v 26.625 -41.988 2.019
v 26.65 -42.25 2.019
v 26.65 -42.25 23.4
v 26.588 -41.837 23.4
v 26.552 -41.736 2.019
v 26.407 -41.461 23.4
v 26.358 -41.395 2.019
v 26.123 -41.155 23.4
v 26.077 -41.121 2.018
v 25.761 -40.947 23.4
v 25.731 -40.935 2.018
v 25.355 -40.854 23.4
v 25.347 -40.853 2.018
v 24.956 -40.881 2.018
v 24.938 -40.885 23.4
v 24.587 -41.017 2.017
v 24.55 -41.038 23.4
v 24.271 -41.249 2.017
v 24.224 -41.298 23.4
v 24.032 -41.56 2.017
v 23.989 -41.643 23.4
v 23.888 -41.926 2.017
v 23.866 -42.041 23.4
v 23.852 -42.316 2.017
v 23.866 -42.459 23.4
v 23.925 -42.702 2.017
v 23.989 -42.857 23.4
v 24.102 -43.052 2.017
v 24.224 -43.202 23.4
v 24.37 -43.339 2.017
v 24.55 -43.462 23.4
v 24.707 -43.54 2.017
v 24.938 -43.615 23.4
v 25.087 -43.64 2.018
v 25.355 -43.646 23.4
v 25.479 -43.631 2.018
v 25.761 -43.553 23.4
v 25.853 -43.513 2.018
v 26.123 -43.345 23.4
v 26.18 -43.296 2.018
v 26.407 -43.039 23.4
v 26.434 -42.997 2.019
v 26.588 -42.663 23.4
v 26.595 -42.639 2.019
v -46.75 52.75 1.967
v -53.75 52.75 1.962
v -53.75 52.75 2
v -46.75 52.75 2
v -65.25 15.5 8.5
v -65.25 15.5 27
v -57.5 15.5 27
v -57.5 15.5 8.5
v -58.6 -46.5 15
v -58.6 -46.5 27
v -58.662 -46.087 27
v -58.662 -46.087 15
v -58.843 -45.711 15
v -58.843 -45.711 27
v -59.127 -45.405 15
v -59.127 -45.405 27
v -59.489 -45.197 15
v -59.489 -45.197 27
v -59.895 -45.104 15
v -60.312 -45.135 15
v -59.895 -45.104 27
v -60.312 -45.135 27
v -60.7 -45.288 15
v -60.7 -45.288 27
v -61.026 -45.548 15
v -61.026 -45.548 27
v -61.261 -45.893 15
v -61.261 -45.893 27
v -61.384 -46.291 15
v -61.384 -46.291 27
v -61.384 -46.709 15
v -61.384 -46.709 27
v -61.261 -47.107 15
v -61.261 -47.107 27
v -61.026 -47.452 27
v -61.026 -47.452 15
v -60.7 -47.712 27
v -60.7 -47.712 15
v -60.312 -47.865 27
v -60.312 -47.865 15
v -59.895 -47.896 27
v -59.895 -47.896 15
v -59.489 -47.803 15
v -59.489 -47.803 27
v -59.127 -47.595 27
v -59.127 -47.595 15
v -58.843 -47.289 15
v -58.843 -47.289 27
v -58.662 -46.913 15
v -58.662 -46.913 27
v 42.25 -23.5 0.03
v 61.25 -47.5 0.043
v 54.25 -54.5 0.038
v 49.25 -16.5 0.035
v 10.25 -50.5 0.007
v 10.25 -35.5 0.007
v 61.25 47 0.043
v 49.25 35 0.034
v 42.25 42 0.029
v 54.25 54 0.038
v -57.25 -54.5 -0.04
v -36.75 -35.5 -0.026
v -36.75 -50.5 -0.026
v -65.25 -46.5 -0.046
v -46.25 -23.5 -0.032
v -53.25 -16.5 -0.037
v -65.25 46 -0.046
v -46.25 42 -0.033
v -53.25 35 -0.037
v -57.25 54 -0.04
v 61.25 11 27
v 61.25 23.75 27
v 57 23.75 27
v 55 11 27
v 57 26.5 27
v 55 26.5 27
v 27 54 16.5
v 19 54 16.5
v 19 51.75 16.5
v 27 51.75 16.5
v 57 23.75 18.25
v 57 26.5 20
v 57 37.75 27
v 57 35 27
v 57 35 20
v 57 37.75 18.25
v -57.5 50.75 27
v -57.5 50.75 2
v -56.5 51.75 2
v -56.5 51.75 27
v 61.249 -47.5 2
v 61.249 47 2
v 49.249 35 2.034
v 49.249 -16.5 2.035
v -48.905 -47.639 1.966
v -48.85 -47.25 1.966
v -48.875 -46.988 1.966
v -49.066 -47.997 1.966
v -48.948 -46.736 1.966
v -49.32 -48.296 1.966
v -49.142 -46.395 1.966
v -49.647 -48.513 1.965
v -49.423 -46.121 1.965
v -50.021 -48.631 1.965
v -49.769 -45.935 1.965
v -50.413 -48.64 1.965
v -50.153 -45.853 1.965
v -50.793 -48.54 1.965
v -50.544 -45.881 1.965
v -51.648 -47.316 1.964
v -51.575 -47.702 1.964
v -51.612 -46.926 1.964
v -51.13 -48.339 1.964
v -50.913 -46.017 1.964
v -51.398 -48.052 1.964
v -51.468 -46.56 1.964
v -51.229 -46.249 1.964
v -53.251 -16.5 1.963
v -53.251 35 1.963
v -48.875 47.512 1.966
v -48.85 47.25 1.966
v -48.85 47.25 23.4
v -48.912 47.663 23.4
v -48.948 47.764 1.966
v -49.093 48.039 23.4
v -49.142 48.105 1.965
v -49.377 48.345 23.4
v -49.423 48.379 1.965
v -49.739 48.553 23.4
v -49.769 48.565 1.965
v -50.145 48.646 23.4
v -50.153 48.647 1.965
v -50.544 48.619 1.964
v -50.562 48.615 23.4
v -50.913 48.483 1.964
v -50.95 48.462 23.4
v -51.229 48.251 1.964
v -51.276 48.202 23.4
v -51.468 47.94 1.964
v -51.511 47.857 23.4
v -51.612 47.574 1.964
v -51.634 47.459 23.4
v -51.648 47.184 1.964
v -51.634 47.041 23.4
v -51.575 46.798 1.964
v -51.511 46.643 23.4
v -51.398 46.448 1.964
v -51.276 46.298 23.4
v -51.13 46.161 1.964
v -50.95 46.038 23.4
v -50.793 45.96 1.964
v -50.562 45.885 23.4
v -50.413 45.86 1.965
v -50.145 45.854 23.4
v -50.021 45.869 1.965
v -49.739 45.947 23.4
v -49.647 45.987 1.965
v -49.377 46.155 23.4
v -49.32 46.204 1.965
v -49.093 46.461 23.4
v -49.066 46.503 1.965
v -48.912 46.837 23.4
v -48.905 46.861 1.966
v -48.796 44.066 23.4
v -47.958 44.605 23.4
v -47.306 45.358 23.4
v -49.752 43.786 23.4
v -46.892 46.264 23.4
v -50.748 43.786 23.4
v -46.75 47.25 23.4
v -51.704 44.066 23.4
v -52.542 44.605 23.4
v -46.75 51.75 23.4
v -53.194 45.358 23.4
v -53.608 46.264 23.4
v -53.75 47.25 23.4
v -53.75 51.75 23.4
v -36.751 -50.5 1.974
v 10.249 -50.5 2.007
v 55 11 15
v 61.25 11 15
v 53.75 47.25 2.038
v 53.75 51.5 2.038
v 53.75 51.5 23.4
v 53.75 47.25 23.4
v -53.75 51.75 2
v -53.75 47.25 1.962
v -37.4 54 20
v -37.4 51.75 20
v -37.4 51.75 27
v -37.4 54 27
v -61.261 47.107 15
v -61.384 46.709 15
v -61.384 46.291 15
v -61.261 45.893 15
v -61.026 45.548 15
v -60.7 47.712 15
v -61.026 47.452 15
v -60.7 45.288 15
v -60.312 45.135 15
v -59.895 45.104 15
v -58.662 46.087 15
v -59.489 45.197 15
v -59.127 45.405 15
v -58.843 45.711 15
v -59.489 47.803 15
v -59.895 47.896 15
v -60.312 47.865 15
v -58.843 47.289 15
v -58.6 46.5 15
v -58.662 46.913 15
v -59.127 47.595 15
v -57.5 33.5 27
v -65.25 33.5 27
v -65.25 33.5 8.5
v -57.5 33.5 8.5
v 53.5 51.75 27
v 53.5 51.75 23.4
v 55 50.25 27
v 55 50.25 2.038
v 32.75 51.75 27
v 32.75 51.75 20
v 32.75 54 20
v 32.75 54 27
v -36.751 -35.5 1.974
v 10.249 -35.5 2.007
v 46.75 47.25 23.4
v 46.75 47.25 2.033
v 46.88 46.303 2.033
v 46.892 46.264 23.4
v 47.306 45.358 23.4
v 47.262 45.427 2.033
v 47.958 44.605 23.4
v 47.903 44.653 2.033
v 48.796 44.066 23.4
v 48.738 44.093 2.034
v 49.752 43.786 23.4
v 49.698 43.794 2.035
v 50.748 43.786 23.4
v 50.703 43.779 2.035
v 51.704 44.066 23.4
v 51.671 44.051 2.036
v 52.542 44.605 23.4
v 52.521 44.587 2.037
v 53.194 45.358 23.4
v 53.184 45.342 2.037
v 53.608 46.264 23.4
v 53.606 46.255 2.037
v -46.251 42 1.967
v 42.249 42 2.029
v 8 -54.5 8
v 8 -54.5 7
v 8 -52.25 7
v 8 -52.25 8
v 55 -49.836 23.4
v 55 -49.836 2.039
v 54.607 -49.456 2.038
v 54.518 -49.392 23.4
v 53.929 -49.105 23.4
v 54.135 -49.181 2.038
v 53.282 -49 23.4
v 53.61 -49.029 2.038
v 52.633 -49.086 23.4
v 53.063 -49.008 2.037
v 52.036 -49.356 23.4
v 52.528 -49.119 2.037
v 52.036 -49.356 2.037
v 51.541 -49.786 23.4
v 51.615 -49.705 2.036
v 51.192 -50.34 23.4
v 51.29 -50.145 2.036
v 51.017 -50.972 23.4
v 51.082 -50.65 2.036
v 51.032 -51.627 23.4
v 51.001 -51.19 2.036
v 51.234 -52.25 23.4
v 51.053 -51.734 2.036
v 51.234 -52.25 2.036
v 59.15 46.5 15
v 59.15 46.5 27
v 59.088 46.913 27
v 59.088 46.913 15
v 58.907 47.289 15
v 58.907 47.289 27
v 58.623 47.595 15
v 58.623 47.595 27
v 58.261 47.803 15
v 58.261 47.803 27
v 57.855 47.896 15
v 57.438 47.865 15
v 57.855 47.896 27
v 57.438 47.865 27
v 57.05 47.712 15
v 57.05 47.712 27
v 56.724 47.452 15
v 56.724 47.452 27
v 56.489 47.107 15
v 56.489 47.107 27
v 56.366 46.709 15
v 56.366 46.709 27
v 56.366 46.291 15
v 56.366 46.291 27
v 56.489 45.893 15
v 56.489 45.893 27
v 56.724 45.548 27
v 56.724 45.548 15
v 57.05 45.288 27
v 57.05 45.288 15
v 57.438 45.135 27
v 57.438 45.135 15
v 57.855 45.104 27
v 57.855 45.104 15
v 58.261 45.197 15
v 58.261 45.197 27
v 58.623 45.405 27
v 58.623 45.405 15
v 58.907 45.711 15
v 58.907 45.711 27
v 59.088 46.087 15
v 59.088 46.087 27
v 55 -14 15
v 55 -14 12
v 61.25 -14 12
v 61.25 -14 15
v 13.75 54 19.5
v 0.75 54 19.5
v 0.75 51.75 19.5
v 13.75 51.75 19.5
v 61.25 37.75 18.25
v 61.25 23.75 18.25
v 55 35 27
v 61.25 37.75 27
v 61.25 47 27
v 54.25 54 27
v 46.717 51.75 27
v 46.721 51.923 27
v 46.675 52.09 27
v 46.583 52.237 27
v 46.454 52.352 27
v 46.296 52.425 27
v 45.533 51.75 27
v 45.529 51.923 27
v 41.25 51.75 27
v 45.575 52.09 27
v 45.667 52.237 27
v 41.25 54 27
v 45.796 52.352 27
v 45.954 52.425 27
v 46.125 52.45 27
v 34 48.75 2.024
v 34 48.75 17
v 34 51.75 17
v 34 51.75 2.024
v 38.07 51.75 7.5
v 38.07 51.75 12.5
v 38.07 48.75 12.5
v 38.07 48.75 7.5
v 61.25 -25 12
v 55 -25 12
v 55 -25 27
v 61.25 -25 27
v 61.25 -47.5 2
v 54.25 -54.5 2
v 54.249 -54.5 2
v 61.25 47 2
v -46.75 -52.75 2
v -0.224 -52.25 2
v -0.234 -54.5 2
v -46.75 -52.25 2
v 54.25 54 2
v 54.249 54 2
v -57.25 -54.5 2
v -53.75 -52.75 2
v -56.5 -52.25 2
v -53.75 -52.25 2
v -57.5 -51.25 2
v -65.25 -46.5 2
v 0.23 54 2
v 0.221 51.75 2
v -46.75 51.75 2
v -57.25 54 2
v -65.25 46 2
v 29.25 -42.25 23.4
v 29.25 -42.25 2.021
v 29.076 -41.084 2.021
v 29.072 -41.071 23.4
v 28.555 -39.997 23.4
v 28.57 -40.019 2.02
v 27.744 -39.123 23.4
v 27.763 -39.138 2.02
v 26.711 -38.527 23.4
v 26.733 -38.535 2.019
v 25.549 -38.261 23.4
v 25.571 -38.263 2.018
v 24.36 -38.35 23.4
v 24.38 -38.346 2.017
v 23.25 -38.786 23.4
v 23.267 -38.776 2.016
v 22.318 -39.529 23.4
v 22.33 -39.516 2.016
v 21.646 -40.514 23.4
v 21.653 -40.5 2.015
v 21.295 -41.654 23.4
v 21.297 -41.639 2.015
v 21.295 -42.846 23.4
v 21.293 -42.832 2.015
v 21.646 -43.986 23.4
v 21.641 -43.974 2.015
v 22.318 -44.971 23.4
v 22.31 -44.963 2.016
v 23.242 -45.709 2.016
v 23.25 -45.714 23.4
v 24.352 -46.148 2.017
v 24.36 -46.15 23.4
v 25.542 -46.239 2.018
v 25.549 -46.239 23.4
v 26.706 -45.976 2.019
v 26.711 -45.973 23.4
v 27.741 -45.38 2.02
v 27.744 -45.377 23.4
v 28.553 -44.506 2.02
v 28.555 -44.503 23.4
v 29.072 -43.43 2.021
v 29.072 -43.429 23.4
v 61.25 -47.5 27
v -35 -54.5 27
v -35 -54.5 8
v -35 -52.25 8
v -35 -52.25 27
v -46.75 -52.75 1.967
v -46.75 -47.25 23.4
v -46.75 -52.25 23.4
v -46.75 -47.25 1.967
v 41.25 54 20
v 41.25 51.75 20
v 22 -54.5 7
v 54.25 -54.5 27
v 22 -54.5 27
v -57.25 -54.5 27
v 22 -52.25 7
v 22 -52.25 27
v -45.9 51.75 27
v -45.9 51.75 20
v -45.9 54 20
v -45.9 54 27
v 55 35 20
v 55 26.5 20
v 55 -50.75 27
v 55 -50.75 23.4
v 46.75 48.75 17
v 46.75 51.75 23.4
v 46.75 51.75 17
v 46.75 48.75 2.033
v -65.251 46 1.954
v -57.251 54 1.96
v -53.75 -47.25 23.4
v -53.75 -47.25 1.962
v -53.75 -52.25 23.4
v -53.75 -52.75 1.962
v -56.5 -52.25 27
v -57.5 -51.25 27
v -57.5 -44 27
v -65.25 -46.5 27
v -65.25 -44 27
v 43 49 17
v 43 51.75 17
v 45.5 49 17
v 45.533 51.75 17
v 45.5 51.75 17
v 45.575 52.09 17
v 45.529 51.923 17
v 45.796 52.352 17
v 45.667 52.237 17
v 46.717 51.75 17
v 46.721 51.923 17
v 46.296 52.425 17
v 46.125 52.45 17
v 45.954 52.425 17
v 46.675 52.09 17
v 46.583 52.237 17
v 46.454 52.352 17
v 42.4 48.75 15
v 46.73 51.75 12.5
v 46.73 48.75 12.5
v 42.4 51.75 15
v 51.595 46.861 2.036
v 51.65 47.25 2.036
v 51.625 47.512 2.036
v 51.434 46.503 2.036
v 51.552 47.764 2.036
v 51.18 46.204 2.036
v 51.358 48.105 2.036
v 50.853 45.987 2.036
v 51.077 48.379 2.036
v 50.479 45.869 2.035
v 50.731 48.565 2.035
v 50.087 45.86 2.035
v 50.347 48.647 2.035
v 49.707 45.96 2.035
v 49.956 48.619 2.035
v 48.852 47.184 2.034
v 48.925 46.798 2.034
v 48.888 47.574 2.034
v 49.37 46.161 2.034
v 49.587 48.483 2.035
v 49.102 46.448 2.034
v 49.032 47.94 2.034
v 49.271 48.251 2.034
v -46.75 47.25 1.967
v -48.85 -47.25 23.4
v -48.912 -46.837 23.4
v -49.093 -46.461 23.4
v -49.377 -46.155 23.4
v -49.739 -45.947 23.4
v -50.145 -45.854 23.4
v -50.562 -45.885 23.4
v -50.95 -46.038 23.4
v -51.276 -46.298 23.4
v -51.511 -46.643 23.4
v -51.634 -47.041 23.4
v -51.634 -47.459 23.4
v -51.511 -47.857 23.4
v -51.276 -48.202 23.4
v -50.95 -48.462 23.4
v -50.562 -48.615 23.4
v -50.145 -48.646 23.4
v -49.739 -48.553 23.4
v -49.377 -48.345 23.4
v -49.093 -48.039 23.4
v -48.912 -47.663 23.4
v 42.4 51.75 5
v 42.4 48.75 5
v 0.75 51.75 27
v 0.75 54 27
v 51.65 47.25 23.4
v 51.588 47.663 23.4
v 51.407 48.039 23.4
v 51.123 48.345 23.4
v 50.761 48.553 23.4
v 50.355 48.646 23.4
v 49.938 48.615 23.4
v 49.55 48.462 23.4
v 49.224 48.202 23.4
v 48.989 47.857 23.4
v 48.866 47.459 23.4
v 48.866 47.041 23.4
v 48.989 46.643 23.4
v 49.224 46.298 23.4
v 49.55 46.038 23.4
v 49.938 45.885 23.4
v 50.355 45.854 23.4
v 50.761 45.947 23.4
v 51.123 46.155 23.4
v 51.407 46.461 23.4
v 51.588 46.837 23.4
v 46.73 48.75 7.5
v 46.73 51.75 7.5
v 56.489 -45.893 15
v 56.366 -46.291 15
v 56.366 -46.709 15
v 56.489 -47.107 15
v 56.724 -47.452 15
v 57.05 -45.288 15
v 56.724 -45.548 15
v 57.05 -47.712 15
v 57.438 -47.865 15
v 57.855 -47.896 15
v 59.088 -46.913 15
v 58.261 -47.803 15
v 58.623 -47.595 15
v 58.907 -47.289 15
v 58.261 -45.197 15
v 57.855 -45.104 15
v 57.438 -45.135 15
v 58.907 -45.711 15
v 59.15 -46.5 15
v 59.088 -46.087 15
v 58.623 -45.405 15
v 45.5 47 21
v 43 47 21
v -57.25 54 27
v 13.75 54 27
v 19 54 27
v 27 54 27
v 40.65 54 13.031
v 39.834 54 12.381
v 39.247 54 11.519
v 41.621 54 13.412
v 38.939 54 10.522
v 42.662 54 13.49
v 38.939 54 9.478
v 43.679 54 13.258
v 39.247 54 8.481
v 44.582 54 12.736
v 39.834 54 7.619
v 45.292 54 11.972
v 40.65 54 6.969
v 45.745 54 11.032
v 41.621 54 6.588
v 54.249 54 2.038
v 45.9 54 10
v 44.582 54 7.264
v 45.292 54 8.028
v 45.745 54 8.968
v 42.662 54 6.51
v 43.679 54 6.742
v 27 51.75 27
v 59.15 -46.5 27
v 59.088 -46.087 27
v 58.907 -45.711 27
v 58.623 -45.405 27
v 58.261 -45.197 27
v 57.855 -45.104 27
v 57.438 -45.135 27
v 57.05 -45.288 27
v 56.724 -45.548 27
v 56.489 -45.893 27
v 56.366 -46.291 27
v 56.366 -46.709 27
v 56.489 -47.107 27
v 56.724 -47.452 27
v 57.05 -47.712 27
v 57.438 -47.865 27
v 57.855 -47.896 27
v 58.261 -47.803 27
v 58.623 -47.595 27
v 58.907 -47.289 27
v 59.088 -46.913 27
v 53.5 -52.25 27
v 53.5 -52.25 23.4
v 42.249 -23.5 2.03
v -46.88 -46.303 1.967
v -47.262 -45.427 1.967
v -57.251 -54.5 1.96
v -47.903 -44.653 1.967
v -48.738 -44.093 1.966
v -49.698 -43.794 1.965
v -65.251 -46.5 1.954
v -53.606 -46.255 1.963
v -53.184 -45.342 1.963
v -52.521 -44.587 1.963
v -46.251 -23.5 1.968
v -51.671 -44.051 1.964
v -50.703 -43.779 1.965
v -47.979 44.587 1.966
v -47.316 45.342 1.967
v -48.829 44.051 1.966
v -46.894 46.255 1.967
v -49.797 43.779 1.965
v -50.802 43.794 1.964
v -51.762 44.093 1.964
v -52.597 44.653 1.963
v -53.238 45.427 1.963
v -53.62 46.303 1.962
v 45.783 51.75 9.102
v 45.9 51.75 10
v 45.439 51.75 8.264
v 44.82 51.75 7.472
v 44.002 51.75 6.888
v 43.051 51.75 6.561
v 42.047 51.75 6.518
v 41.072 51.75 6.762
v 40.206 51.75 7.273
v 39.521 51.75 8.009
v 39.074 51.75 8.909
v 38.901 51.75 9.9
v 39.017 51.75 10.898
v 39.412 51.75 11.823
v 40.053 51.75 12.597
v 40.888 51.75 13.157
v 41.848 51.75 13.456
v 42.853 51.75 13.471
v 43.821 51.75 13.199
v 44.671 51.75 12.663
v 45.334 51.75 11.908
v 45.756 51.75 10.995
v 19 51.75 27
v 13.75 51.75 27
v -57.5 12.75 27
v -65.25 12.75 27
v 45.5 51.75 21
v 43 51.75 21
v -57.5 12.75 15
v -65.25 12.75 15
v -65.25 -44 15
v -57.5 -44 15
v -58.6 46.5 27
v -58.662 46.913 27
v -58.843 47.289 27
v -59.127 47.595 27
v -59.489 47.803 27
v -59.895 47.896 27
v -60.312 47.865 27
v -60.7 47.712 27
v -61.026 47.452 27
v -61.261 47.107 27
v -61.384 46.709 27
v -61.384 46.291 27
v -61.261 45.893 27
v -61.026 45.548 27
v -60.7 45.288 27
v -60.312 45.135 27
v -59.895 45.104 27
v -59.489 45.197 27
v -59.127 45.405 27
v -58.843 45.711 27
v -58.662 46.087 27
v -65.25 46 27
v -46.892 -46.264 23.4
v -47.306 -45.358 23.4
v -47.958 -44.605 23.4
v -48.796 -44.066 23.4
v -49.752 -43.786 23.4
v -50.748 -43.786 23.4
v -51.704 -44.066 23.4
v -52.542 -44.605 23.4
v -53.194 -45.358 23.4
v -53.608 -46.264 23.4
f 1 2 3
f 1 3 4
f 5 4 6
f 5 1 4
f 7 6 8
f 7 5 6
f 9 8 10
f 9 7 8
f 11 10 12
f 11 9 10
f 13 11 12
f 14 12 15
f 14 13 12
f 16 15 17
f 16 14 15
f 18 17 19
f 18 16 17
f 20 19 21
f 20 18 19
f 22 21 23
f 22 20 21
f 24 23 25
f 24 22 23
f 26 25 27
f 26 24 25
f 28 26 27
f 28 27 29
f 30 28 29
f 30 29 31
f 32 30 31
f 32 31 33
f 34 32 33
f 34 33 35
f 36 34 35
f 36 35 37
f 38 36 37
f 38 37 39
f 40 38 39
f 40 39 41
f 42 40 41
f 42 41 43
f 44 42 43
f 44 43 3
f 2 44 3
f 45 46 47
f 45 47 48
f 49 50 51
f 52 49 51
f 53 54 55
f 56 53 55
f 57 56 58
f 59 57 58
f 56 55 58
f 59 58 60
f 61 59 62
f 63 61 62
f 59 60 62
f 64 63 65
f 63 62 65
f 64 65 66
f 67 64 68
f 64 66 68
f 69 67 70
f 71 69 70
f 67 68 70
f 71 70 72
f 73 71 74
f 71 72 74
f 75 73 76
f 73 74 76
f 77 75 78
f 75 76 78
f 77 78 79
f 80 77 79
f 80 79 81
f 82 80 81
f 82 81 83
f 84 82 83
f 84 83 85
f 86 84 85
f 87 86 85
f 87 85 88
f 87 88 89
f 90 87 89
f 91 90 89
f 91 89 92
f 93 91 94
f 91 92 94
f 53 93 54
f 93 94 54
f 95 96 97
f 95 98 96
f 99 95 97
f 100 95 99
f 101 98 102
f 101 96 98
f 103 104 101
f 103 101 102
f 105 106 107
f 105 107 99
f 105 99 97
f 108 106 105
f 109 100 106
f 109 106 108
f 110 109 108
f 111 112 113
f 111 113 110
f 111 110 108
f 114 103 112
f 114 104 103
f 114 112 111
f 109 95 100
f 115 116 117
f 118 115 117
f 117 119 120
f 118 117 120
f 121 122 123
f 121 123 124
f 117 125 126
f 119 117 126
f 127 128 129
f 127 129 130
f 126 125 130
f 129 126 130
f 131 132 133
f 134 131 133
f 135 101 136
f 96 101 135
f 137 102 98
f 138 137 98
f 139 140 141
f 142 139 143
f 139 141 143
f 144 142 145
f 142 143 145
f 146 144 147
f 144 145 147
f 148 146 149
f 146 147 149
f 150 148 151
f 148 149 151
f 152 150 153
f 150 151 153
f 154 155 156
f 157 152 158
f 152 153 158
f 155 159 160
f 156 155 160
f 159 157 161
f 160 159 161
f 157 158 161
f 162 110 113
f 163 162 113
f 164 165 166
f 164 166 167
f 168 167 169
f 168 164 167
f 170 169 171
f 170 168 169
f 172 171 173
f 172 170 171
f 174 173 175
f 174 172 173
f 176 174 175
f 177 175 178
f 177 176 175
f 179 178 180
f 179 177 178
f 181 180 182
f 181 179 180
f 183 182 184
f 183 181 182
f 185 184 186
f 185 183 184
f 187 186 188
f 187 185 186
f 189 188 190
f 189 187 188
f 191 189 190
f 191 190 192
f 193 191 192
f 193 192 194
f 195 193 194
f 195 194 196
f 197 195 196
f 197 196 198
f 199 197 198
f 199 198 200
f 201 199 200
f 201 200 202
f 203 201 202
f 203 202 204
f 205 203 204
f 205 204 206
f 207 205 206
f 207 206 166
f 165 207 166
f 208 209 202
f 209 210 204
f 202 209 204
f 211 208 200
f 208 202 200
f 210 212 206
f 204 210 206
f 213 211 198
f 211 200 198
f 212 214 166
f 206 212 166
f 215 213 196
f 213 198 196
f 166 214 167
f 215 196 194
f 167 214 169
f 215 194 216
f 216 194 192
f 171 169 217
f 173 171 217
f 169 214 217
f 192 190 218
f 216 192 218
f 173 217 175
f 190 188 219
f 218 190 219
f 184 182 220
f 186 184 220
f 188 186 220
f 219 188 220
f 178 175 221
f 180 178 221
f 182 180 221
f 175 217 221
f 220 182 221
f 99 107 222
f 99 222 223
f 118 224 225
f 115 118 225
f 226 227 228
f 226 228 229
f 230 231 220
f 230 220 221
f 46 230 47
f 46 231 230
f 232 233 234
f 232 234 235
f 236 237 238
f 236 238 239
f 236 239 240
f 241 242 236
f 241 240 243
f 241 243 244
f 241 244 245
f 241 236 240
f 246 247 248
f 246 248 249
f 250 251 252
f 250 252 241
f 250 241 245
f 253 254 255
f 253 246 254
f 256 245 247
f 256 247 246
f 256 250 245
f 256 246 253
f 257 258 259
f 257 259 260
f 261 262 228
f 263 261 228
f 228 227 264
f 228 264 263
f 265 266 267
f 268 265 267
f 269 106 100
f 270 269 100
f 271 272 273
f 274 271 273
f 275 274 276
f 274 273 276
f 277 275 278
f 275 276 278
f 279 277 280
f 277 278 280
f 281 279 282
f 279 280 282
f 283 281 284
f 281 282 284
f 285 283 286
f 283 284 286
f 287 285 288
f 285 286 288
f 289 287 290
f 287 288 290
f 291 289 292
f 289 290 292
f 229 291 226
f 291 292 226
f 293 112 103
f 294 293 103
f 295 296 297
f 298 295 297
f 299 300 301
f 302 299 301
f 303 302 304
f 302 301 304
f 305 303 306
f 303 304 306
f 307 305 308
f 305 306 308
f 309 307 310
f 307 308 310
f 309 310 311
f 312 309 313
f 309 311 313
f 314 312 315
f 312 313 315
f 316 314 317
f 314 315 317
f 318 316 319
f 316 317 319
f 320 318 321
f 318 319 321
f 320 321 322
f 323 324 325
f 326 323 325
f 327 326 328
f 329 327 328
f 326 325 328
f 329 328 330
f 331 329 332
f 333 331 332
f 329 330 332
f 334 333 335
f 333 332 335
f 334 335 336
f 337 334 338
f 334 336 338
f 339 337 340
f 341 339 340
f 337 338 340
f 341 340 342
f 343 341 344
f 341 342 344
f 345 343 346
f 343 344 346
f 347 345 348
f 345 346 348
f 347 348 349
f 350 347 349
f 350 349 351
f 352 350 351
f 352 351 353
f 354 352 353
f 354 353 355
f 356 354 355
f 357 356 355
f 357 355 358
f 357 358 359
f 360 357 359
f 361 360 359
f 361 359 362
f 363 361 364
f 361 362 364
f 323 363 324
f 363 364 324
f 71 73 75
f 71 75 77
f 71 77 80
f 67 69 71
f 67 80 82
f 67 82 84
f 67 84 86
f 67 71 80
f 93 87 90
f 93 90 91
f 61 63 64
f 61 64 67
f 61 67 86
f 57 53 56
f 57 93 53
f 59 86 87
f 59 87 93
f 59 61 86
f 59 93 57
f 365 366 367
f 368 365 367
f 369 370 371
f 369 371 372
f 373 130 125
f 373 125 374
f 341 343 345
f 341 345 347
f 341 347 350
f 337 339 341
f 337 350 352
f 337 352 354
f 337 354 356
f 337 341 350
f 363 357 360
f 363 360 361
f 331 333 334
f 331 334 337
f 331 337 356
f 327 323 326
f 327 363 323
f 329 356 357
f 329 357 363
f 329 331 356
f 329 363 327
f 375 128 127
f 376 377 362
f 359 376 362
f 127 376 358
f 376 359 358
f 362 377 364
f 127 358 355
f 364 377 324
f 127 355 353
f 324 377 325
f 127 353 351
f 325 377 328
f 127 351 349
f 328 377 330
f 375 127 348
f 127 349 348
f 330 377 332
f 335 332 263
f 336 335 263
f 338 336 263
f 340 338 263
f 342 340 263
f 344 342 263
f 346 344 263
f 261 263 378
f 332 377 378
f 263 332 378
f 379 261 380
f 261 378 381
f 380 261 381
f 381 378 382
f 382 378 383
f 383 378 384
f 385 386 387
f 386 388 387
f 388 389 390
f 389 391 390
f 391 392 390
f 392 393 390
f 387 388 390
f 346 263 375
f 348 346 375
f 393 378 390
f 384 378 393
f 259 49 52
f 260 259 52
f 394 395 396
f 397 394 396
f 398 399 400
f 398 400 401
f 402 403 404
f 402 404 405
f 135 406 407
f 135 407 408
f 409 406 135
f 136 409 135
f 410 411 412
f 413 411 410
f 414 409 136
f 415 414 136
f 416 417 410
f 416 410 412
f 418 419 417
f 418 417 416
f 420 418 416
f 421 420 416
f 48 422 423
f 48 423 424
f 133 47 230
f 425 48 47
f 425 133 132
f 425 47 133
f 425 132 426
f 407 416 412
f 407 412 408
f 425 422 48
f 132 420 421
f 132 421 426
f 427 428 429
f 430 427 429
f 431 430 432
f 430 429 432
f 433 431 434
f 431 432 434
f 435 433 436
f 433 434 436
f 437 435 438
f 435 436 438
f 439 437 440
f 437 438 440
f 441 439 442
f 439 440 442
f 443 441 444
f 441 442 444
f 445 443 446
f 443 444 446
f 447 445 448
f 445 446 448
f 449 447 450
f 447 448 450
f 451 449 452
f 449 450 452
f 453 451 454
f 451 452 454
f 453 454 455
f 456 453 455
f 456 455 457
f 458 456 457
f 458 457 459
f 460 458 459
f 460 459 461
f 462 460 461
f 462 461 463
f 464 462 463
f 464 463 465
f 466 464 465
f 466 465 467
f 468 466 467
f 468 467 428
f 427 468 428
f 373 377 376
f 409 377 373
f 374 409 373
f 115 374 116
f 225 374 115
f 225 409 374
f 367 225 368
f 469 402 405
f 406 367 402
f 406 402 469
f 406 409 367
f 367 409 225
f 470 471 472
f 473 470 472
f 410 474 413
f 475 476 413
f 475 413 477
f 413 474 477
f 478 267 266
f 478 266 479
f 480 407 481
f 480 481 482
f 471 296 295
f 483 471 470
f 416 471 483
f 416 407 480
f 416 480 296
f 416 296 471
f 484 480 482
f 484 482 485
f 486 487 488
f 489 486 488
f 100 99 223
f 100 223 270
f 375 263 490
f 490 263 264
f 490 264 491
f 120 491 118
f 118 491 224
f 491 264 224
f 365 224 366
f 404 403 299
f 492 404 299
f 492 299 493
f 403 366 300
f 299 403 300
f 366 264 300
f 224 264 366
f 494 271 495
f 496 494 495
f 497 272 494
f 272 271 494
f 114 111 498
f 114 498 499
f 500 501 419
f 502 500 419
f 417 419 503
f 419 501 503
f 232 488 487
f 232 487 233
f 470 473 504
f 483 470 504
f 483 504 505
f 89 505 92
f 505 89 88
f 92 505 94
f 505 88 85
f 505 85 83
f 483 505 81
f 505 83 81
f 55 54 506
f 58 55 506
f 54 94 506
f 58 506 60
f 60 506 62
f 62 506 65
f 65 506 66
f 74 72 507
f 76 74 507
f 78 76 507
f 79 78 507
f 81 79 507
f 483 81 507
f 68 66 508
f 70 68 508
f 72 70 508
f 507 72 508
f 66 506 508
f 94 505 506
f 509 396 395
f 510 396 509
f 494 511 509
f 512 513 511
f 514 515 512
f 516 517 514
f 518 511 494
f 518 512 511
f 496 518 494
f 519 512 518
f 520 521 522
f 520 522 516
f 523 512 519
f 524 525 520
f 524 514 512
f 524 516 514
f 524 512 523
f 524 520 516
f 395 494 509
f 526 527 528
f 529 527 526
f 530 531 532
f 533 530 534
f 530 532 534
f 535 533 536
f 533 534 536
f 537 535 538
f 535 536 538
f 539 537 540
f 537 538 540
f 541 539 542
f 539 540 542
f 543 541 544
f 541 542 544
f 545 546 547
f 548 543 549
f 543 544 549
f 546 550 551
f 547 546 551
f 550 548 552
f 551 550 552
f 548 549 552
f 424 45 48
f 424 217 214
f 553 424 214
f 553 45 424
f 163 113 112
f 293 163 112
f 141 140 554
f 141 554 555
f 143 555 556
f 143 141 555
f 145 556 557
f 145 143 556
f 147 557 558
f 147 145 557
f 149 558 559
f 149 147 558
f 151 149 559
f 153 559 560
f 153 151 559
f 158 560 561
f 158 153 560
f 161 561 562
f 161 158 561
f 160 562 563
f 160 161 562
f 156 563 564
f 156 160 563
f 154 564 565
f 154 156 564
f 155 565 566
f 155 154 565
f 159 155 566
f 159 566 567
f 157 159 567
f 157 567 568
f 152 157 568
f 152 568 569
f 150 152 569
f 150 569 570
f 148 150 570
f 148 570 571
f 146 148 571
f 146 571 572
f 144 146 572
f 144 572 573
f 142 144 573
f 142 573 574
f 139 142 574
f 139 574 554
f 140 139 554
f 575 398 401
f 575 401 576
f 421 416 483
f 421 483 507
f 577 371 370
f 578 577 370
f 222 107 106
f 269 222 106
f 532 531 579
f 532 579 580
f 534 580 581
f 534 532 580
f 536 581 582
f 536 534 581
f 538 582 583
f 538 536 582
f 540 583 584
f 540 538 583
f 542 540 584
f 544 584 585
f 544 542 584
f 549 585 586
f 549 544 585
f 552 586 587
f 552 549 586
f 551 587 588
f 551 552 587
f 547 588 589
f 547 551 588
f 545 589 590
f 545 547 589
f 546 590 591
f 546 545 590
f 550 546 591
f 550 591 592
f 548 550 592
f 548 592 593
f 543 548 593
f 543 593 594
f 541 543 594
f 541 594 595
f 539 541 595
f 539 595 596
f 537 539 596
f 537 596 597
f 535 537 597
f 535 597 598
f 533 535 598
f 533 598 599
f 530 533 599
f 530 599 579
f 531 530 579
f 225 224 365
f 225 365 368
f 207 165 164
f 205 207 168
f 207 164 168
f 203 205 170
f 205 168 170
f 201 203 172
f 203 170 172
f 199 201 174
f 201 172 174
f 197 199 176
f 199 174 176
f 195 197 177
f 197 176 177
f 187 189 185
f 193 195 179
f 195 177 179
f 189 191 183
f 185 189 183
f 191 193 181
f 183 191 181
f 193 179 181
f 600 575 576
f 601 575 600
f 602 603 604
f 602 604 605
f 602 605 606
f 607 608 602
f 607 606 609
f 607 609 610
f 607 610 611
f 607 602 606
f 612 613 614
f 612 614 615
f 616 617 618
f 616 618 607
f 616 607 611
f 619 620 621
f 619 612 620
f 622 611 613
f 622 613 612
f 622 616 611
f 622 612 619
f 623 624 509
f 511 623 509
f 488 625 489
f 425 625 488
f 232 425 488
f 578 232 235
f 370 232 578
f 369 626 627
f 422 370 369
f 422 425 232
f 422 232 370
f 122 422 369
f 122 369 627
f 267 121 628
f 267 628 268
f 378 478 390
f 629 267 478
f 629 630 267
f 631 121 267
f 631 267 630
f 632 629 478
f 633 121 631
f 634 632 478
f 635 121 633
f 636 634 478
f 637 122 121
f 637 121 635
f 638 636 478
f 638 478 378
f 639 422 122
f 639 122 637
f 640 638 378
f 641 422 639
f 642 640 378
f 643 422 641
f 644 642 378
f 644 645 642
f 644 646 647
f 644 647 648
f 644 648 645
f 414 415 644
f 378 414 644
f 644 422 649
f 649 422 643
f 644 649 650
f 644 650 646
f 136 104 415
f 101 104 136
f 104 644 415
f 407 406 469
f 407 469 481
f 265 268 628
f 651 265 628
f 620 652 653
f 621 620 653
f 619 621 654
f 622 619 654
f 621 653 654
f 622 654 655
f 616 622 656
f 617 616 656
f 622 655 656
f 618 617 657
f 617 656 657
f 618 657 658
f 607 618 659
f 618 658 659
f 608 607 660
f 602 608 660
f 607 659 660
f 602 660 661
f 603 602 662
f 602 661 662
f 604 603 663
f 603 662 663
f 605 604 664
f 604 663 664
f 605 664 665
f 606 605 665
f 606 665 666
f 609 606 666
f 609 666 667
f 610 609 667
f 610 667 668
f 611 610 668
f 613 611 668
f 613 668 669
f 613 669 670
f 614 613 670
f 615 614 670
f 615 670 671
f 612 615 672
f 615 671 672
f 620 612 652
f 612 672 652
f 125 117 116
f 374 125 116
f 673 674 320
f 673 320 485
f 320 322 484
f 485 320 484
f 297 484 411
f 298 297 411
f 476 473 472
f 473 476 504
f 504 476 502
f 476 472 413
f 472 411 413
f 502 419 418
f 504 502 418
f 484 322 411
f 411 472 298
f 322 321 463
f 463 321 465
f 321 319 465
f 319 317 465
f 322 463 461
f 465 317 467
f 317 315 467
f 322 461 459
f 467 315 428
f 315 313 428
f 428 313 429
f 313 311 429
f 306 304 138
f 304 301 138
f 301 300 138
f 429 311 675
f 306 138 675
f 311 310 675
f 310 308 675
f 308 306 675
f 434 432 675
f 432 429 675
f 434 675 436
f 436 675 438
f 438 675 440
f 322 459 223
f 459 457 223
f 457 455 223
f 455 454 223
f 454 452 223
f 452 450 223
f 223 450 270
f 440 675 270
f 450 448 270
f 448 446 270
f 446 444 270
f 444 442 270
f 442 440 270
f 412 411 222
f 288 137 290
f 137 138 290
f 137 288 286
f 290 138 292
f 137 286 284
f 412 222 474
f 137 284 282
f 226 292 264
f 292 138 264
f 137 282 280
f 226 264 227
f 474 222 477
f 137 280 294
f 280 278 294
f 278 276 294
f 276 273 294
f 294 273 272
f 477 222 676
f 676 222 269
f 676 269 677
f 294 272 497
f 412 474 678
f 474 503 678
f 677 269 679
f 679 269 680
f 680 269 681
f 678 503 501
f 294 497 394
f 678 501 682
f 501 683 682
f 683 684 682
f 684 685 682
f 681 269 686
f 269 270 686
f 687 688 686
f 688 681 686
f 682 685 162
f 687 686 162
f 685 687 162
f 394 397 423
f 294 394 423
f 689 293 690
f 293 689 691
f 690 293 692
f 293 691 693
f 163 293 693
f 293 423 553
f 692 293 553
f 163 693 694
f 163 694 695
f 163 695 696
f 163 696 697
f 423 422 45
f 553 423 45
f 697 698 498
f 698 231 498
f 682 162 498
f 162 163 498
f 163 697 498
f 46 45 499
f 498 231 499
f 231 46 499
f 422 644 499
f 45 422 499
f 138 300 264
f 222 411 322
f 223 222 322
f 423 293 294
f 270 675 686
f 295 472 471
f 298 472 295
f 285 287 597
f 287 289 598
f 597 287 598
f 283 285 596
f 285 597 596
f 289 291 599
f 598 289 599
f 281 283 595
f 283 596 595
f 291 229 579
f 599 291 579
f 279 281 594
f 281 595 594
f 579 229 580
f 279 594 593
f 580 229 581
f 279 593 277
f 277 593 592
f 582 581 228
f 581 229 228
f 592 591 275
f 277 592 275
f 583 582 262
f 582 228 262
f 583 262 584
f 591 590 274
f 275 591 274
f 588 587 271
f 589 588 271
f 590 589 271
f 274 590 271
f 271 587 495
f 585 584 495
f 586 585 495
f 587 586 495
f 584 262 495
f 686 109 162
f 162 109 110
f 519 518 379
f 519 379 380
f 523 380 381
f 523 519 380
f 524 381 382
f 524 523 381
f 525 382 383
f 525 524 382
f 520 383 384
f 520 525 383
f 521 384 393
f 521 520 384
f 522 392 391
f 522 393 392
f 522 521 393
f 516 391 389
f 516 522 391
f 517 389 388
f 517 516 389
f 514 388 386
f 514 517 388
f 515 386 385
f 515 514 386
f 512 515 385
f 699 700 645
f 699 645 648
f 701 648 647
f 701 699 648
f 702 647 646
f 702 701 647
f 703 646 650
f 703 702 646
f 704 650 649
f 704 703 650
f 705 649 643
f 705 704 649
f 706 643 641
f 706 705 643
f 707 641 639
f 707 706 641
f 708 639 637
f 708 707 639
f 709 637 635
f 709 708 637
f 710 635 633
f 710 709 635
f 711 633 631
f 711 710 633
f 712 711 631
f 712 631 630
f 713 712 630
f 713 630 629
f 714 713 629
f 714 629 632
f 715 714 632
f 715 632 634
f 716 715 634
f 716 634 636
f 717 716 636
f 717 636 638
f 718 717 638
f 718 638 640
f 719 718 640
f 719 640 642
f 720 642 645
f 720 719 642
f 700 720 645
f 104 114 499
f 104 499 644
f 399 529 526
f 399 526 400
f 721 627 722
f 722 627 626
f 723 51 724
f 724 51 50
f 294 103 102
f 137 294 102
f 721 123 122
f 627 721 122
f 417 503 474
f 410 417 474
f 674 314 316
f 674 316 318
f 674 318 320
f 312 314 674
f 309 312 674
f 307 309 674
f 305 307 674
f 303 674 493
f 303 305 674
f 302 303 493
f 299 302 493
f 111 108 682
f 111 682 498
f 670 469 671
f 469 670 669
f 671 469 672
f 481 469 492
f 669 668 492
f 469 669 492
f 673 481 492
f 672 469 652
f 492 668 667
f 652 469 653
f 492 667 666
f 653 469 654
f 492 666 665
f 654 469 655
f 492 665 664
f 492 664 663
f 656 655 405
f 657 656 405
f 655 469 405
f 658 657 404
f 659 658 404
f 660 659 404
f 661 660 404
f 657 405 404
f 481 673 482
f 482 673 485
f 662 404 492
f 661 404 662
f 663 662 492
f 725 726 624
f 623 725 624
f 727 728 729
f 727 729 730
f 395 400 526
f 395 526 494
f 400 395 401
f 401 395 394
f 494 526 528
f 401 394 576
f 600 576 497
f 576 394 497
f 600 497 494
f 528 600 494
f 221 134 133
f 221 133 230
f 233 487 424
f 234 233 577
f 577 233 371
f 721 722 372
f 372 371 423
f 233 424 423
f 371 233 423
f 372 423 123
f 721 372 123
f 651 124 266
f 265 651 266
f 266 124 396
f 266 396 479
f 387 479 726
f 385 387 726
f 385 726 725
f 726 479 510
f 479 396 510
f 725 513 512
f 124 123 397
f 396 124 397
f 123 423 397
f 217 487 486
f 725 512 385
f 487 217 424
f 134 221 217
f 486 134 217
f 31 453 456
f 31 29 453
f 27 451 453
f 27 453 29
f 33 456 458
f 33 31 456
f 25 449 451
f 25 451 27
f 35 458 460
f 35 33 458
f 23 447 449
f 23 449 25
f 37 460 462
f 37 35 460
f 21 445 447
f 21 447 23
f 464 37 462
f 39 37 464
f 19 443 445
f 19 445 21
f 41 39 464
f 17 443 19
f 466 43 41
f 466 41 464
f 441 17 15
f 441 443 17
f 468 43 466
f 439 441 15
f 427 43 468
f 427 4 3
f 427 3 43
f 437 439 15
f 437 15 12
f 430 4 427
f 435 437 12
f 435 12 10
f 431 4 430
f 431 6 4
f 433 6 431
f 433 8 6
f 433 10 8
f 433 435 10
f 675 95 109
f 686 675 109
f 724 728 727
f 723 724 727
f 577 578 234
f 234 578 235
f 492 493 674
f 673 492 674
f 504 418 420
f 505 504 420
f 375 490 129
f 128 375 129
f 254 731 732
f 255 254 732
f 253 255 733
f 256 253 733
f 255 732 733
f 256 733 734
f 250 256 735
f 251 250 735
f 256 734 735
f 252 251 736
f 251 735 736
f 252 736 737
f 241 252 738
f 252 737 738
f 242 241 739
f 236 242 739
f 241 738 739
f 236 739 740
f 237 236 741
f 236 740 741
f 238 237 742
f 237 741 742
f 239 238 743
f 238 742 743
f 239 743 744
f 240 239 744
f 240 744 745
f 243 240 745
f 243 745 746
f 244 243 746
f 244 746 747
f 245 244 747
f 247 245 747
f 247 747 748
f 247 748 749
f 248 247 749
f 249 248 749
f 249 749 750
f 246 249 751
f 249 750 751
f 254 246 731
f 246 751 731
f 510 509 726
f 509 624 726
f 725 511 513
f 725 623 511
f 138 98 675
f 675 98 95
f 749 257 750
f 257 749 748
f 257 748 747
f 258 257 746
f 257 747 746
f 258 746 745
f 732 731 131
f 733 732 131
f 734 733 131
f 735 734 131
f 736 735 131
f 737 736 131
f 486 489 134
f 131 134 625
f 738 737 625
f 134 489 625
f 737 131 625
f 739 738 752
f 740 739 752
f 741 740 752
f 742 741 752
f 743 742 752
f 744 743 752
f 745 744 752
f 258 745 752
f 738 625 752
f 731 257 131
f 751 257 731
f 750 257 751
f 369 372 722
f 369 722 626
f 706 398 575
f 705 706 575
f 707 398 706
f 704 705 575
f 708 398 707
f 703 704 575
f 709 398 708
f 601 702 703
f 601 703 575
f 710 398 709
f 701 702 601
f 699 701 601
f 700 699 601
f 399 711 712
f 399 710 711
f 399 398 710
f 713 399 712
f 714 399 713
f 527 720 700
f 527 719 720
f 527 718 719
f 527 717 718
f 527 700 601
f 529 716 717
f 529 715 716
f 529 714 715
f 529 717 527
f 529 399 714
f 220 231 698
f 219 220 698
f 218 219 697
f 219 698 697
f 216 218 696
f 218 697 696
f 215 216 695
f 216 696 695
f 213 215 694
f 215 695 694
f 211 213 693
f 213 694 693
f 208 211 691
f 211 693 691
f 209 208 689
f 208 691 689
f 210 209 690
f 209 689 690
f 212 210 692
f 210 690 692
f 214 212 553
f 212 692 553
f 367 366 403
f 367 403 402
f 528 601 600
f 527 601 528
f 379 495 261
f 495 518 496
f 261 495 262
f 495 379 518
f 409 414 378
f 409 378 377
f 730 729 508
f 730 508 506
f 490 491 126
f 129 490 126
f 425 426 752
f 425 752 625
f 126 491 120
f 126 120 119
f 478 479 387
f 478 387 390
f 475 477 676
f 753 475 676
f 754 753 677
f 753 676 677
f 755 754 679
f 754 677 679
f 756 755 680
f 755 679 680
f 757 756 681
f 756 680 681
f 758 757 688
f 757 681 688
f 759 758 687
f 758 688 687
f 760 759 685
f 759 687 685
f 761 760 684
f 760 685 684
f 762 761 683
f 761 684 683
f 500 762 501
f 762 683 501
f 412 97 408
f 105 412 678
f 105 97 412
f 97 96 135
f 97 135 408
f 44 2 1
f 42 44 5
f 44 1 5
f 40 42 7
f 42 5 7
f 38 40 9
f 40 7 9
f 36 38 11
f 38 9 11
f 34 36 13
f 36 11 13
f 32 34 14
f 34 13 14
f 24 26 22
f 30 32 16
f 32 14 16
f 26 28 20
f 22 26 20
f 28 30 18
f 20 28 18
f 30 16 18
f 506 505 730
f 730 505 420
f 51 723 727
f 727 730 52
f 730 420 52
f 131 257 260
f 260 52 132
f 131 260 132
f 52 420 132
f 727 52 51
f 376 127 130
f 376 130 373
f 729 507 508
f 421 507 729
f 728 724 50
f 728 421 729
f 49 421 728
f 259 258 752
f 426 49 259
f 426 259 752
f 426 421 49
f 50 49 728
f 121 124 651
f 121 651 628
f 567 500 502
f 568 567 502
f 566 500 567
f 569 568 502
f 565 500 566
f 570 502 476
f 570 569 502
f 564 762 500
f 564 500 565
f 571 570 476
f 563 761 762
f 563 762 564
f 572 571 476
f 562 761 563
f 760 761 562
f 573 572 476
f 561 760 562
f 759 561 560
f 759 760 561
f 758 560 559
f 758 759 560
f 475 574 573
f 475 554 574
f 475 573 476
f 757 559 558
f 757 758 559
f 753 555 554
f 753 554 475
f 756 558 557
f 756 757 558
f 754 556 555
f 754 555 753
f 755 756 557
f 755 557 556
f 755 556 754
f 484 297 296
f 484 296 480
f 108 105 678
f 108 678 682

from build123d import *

# Parameters (mm, degrees)
BOX013_W                   = 14
BOX013_H                   = 3
BOX013_DEPTH               = 18
CYLINDER006_R              = 3.5
CYLINDER006_DEPTH          = 8
CYLINDER006_ROLL_ANGLE     = -90
CYLINDER_R                 = 0.6
CYLINDER_DEPTH             = 11
PRISM_DEPTH                = 10
PRISM_ROLL_ANGLE           = 90.00003
PRISM_PITCH_ANGLE          = -30.000033
PRISM_PLACEMENT_ANGLE      = -8e-06
BOX001_W                   = 10
BOX001_H                   = 18
BOX001_DEPTH               = 20
BOX002_W                   = 10
BOX002_H                   = 11
BOX002_DEPTH               = 15
BOX003_W                   = 10
BOX003_H                   = 25
BOX003_DEPTH               = 12
BOX004_W                   = 8.5
BOX004_H                   = 4
BOX004_DEPTH               = 7
BOX005_W                   = 8
BOX005_H                   = 4
BOX005_DEPTH               = 10.5
BOX006_W                   = 8.5
BOX006_H                   = 4
BOX006_DEPTH               = 7
BOX007_W                   = 13
BOX007_H                   = 4
BOX007_DEPTH               = 8
BOX008_W                   = 10
BOX008_H                   = 8.5
BOX008_DEPTH               = 8
BOX009_W                   = 5
BOX009_H                   = 14
BOX009_DEPTH               = 9
BOX010_W                   = 43
BOX010_H                   = 4
BOX010_DEPTH               = 19
SKETCH075_R                = 1.4
EXTRUDE_DEPTH              = 12
BOX011_W                   = 14
BOX011_H                   = 4
BOX011_DEPTH               = 12
BOX_W                      = 10
BOX_H                      = 56.75
BOX_DEPTH                  = 12
EXTRUDE073_DEPTH           = 25
EXTRUDE072_DEPTH           = 25
SKETCH072_R                = 4
SKETCH072_R_2              = 1.4
SKETCH072_R_3              = 2.25
EXTRUDE071_DEPTH           = 22.4
BOX012_W                   = 13
BOX012_H                   = 3
BOX012_DEPTH               = 15
EXTRUDE080_DEPTH           = 2.5
SKETCH071_W                = 47
SKETCH071_H                = 15
EXTRUDE070_DEPTH           = 2
EXTRUDE070_ROLL_ANGLE      = -0.000172
EXTRUDE070_PITCH_ANGLE     = -0.040176
EXTRUDE070_PLACEMENT_ANGLE = 2.8e-05


with BuildPart() as cube013:
    # Box013 → Box013 (new body)
    with BuildSketch(Plane(origin=(8, -54.5, 7), x_dir=(1, 0, 0), z_dir=(0, 0, 1))):
        with Locations((7, 1.5)):
            Rectangle(BOX013_W, BOX013_H)
    extrude(amount=BOX013_DEPTH)


with BuildPart() as cylinder006:
    # Cylinder006 → Cylinder006 (new body)
    with BuildSketch(Plane.XY):
        Circle(CYLINDER006_R)
    extrude(amount=CYLINDER006_DEPTH)


with BuildPart() as cylinder006_1:
    # Cylinder006 roll: moved
    add(cylinder006.part.rotate(Axis((0, 0, 0), (1, 0, 0)), CYLINDER006_ROLL_ANGLE))


with BuildPart() as cylinder006_2:
    # Cylinder006 placement: moved
    add(cylinder006_1.part.moved(Location((42.4, 48, 10))))


with BuildPart() as cylinder:
    # Cylinder → Cylinder (new body)
    with BuildSketch(Plane(origin=(46.125, 51.85, 17), x_dir=(1, 0, 0), z_dir=(0, 0, 1))):
        Circle(CYLINDER_R)
    extrude(amount=CYLINDER_DEPTH)


with BuildPart() as fusion032:
    # Prism → Prism (new body)
    with BuildSketch(Plane.XY):
        Polygon((5, 0), (2.5, 4.330127), (-2.5, 4.330127), (-5, 0), (-2.5, -4.330127), (2.5, -4.330127), align=None)
    extrude(amount=PRISM_DEPTH)


with BuildPart() as fusion032_1:
    # Prism roll: moved
    add(fusion032.part.rotate(Axis((0, 0, 0), (1, 0, 0)), PRISM_ROLL_ANGLE))


with BuildPart() as fusion032_2:
    # Prism pitch: moved
    add(fusion032_1.part.rotate(Axis((0, 0, 0), (0, 1, 0)), PRISM_PITCH_ANGLE))


with BuildPart() as fusion032_3:
    # Prism placement: moved
    add(fusion032_2.part.moved(Location((42.4, 51.75, 10))).rotate(Axis((42.4, 51.75, 10), (0, 0, 1)), PRISM_PLACEMENT_ANGLE))

    # Fusion032: union Cylinder006, Cylinder
    add(cylinder006_2.part)
    add(cylinder.part)


with BuildPart() as cube001:
    # Box001 → Box001 (new body)
    with BuildSketch(Plane(origin=(-67, 15.5, 8.5), x_dir=(1, 0, 0), z_dir=(0, 0, 1))):
        with Locations((5, 9)):
            Rectangle(BOX001_W, BOX001_H)
    extrude(amount=BOX001_DEPTH)


with BuildPart() as cube002:
    # Box002 → Box002 (new body)
    with BuildSketch(Plane(origin=(54, -25, 12), x_dir=(1, 0, 0), z_dir=(0, 0, 1))):
        with Locations((5, 5.5)):
            Rectangle(BOX002_W, BOX002_H)
    extrude(amount=BOX002_DEPTH)


with BuildPart() as cube003:
    # Box003 → Box003 (new body)
    with BuildSketch(Plane(origin=(54, -14, 15), x_dir=(1, 0, 0), z_dir=(0, 0, 1))):
        with Locations((5, 12.5)):
            Rectangle(BOX003_W, BOX003_H)
    extrude(amount=BOX003_DEPTH)


with BuildPart() as cube004:
    # Box004 → Box004 (new body)
    with BuildSketch(Plane(origin=(32.75, 51, 20), x_dir=(1, 0, 0), z_dir=(0, 0, 1))):
        with Locations((4.25, 2)):
            Rectangle(BOX004_W, BOX004_H)
    extrude(amount=BOX004_DEPTH)


with BuildPart() as cube005:
    # Box005 → Box005 (new body)
    with BuildSketch(Plane(origin=(19, 51, 16.5), x_dir=(1, 0, 0), z_dir=(0, 0, 1))):
        with Locations((4, 2)):
            Rectangle(BOX005_W, BOX005_H)
    extrude(amount=BOX005_DEPTH)


with BuildPart() as cube006:
    # Box006 → Box006 (new body)
    with BuildSketch(Plane(origin=(-45.9, 51, 20), x_dir=(1, 0, 0), z_dir=(0, 0, 1))):
        with Locations((4.25, 2)):
            Rectangle(BOX006_W, BOX006_H)
    extrude(amount=BOX006_DEPTH)


with BuildPart() as cube007:
    # Box007 → Box007 (new body)
    with BuildSketch(Plane(origin=(0.75, 51, 19.5), x_dir=(1, 0, 0), z_dir=(0, 0, 1))):
        with Locations((6.5, 2)):
            Rectangle(BOX007_W, BOX007_H)
    extrude(amount=BOX007_DEPTH)


with BuildPart() as cube008:
    # Box008 → Box008 (new body)
    with BuildSketch(Plane(origin=(54, 26.5, 20), x_dir=(1, 0, 0), z_dir=(0, 0, 1))):
        with Locations((5, 4.25)):
            Rectangle(BOX008_W, BOX008_H)
    extrude(amount=BOX008_DEPTH)


with BuildPart() as cube009:
    # Box009 → Box009 (new body)
    with BuildSketch(Plane(origin=(57, 23.75, 18.25), x_dir=(1, 0, 0), z_dir=(0, 0, 1))):
        with Locations((2.5, 7)):
            Rectangle(BOX009_W, BOX009_H)
    extrude(amount=BOX009_DEPTH)


with BuildPart() as cube010:
    # Box010 → Box010 (new body)
    with BuildSketch(Plane(origin=(-35, -56, 8), x_dir=(1, 0, 0), z_dir=(0, 0, 1))):
        with Locations((21.5, 2)):
            Rectangle(BOX010_W, BOX010_H)
    extrude(amount=BOX010_DEPTH)


with BuildPart() as extrude_body:
    # Sketch075 → Extrude (new body)
    with BuildSketch(Plane.XY.offset(27)):
        with Locations((-60, 46.5)):
            Circle(SKETCH075_R)
        with Locations((57.75, 46.5)):
            Circle(SKETCH075_R)
        with Locations((-60, -46.5)):
            Circle(SKETCH075_R)
        with Locations((57.75, -46.5)):
            Circle(SKETCH075_R)
    extrude(amount=-EXTRUDE_DEPTH)


with BuildPart() as cube011:
    # Box011 → Box011 (new body)
    with BuildSketch(Plane(origin=(8, -55, 15), x_dir=(1, 0, 0), z_dir=(0, 0, 1))):
        with Locations((7, 2)):
            Rectangle(BOX011_W, BOX011_H)
    extrude(amount=BOX011_DEPTH)


with BuildPart() as fusion:
    # Box → Box (new body)
    with BuildSketch(Plane(origin=(-67, -44, 15), x_dir=(1, 0, 0), z_dir=(0, 0, 1))):
        with Locations((5, 28.375)):
            Rectangle(BOX_W, BOX_H)
    extrude(amount=BOX_DEPTH)

    # Fusion: union Cube001, Cube002, Cube003, Cube004, Cube005, Cube006, Cube007, Cube008, Cube009, Cube010, Extrude body, Cube011
    add(cube001.part)
    add(cube002.part)
    add(cube003.part)
    add(cube004.part)
    add(cube005.part)
    add(cube006.part)
    add(cube007.part)
    add(cube008.part)
    add(cube009.part)
    add(cube010.part)
    add(extrude_body.part)
    add(cube011.part)


with BuildPart() as extrude073:
    # Sketch074 → Extrude073 (new body)
    with BuildSketch(Plane.XY):
        Polygon((53.5, -52.25), (-56.5, -52.25), (-57.5, -51.25), (-57.5, 50.75), (-56.5, 51.75), (53.5, 51.75), (55, 50.25), (55, -50.75), align=None)
    extrude(amount=EXTRUDE073_DEPTH)


with BuildPart() as cut001:
    # Sketch073 → Extrude072 (new body)
    with BuildSketch(Plane.XY):
        Polygon((54.25, -54.5), (-57.25, -54.5), (-65.25, -46.5), (-65.25, 46), (-57.25, 54), (54.25, 54), (61.25, 47), (61.25, -47.5), align=None)
    extrude(amount=EXTRUDE072_DEPTH)

    # Cut: cut Extrude073
    add(extrude073.part, mode=Mode.SUBTRACT)


with BuildPart() as cut001_1:
    # Cut placement: moved
    add(cut001.part.moved(Location((0, 0, 2))))

    # Cut001: cut Fusion
    add(fusion.part, mode=Mode.SUBTRACT)


with BuildPart() as extrude071:
    # Sketch072 → Extrude071 (new body)
    with BuildSketch(Plane.XY):
        with Locations((25.25, -42.25)):
            Circle(SKETCH072_R)
        with Locations((25.25, -42.25)):
            Circle(SKETCH072_R_2, mode=Mode.SUBTRACT)
        with Locations((53.25, -51.25)):
            Circle(SKETCH072_R_3)
        with BuildLine():
            Line((-53.75, 52.75), (-46.75, 52.75))
            Line((-46.75, 52.75), (-46.75, 47.25))
            ThreePointArc((-53.75, 47.25), (-50.25, 43.75), (-46.75, 47.25))
            Line((-53.75, 47.25), (-53.75, 52.75))
        make_face()
        with Locations((-50.25, 47.25)):
            Circle(SKETCH072_R_2, mode=Mode.SUBTRACT)
        with BuildLine():
            Line((46.75, 52.75), (53.75, 52.75))
            Line((53.75, 52.75), (53.75, 47.25))
            ThreePointArc((46.75, 47.25), (50.25, 43.75), (53.75, 47.25))
            Line((46.75, 47.25), (46.75, 52.75))
        make_face()
        with Locations((50.25, 47.25)):
            Circle(SKETCH072_R_2, mode=Mode.SUBTRACT)
        with BuildLine():
            Line((-53.75, -52.75), (-46.75, -52.75))
            Line((-46.75, -52.75), (-46.75, -47.25))
            ThreePointArc((-46.75, -47.25), (-50.25, -43.75), (-53.75, -47.25))
            Line((-53.75, -47.25), (-53.75, -52.75))
        make_face()
        with Locations((-50.25, -47.25)):
            Circle(SKETCH072_R_2, mode=Mode.SUBTRACT)
    extrude(amount=EXTRUDE071_DEPTH)


with BuildPart() as extrude071_1:
    # Extrude071 placement: moved
    add(extrude071.part.moved(Location((0, 0, 1))))


with BuildPart() as cube012:
    # Box012 → Box012 (new body)
    with BuildSketch(Plane(origin=(34, 48.75, 2), x_dir=(1, 0, 0), z_dir=(0, 0, 1))):
        with Locations((6.5, 1.5)):
            Rectangle(BOX012_W, BOX012_H)
    extrude(amount=BOX012_DEPTH)


with BuildPart() as extrude080:
    # Sketch091 → Extrude080 (new body)
    with BuildSketch(Plane.YZ):
        Polygon((0, 0), (0, 5), (-5, 5), (-2.5, 0), align=None)
    extrude(amount=EXTRUDE080_DEPTH)


with BuildPart() as extrude080_1:
    # Extrude080 placement: moved
    add(extrude080.part.moved(Location((43, 52, 16))))


with BuildPart() as cut005:
    # Sketch071 → Extrude070 (new body)
    with BuildSketch(Plane.XY):
        Polygon((54.25, -54.5), (-57.25, -54.5), (-65.25, -46.5), (-65.25, 46), (-57.25, 54), (54.25, 54), (61.25, 47), (61.25, -47.5), align=None)
        Polygon((-46.25, 42), (42.25, 42), (49.25, 35), (49.25, -16.5), (42.25, -23.5), (-46.25, -23.5), (-53.25, -16.5), (-53.25, 35), align=None, mode=Mode.SUBTRACT)
        with Locations((-13.25, -43)):
            Rectangle(SKETCH071_W, SKETCH071_H, mode=Mode.SUBTRACT)
    extrude(amount=EXTRUDE070_DEPTH)


with BuildPart() as cut005_1:
    # Extrude070 roll: moved
    add(cut005.part.rotate(Axis((0, 0, 0), (1, 0, 0)), EXTRUDE070_ROLL_ANGLE))


with BuildPart() as cut005_2:
    # Extrude070 pitch: moved
    add(cut005_1.part.rotate(Axis((0, 0, 0), (0, 1, 0)), EXTRUDE070_PITCH_ANGLE))


with BuildPart() as cut005_3:
    # Extrude070 placement: moved
    add(cut005_2.part.rotate(Axis((0, 0, 0), (0, 0, 1)), EXTRUDE070_PLACEMENT_ANGLE))

    # Fusion027: union Extrude071, Cube012, Extrude080
    add(extrude071_1.part)
    add(cube012.part)
    add(extrude080_1.part)

    # Fusion028: union Cut001
    add(cut001_1.part)

    # Cut003: cut Fusion032
    add(fusion032_3.part, mode=Mode.SUBTRACT)

    # Cut005: cut Cube013
    add(cube013.part, mode=Mode.SUBTRACT)


solid = cut005_3.part
